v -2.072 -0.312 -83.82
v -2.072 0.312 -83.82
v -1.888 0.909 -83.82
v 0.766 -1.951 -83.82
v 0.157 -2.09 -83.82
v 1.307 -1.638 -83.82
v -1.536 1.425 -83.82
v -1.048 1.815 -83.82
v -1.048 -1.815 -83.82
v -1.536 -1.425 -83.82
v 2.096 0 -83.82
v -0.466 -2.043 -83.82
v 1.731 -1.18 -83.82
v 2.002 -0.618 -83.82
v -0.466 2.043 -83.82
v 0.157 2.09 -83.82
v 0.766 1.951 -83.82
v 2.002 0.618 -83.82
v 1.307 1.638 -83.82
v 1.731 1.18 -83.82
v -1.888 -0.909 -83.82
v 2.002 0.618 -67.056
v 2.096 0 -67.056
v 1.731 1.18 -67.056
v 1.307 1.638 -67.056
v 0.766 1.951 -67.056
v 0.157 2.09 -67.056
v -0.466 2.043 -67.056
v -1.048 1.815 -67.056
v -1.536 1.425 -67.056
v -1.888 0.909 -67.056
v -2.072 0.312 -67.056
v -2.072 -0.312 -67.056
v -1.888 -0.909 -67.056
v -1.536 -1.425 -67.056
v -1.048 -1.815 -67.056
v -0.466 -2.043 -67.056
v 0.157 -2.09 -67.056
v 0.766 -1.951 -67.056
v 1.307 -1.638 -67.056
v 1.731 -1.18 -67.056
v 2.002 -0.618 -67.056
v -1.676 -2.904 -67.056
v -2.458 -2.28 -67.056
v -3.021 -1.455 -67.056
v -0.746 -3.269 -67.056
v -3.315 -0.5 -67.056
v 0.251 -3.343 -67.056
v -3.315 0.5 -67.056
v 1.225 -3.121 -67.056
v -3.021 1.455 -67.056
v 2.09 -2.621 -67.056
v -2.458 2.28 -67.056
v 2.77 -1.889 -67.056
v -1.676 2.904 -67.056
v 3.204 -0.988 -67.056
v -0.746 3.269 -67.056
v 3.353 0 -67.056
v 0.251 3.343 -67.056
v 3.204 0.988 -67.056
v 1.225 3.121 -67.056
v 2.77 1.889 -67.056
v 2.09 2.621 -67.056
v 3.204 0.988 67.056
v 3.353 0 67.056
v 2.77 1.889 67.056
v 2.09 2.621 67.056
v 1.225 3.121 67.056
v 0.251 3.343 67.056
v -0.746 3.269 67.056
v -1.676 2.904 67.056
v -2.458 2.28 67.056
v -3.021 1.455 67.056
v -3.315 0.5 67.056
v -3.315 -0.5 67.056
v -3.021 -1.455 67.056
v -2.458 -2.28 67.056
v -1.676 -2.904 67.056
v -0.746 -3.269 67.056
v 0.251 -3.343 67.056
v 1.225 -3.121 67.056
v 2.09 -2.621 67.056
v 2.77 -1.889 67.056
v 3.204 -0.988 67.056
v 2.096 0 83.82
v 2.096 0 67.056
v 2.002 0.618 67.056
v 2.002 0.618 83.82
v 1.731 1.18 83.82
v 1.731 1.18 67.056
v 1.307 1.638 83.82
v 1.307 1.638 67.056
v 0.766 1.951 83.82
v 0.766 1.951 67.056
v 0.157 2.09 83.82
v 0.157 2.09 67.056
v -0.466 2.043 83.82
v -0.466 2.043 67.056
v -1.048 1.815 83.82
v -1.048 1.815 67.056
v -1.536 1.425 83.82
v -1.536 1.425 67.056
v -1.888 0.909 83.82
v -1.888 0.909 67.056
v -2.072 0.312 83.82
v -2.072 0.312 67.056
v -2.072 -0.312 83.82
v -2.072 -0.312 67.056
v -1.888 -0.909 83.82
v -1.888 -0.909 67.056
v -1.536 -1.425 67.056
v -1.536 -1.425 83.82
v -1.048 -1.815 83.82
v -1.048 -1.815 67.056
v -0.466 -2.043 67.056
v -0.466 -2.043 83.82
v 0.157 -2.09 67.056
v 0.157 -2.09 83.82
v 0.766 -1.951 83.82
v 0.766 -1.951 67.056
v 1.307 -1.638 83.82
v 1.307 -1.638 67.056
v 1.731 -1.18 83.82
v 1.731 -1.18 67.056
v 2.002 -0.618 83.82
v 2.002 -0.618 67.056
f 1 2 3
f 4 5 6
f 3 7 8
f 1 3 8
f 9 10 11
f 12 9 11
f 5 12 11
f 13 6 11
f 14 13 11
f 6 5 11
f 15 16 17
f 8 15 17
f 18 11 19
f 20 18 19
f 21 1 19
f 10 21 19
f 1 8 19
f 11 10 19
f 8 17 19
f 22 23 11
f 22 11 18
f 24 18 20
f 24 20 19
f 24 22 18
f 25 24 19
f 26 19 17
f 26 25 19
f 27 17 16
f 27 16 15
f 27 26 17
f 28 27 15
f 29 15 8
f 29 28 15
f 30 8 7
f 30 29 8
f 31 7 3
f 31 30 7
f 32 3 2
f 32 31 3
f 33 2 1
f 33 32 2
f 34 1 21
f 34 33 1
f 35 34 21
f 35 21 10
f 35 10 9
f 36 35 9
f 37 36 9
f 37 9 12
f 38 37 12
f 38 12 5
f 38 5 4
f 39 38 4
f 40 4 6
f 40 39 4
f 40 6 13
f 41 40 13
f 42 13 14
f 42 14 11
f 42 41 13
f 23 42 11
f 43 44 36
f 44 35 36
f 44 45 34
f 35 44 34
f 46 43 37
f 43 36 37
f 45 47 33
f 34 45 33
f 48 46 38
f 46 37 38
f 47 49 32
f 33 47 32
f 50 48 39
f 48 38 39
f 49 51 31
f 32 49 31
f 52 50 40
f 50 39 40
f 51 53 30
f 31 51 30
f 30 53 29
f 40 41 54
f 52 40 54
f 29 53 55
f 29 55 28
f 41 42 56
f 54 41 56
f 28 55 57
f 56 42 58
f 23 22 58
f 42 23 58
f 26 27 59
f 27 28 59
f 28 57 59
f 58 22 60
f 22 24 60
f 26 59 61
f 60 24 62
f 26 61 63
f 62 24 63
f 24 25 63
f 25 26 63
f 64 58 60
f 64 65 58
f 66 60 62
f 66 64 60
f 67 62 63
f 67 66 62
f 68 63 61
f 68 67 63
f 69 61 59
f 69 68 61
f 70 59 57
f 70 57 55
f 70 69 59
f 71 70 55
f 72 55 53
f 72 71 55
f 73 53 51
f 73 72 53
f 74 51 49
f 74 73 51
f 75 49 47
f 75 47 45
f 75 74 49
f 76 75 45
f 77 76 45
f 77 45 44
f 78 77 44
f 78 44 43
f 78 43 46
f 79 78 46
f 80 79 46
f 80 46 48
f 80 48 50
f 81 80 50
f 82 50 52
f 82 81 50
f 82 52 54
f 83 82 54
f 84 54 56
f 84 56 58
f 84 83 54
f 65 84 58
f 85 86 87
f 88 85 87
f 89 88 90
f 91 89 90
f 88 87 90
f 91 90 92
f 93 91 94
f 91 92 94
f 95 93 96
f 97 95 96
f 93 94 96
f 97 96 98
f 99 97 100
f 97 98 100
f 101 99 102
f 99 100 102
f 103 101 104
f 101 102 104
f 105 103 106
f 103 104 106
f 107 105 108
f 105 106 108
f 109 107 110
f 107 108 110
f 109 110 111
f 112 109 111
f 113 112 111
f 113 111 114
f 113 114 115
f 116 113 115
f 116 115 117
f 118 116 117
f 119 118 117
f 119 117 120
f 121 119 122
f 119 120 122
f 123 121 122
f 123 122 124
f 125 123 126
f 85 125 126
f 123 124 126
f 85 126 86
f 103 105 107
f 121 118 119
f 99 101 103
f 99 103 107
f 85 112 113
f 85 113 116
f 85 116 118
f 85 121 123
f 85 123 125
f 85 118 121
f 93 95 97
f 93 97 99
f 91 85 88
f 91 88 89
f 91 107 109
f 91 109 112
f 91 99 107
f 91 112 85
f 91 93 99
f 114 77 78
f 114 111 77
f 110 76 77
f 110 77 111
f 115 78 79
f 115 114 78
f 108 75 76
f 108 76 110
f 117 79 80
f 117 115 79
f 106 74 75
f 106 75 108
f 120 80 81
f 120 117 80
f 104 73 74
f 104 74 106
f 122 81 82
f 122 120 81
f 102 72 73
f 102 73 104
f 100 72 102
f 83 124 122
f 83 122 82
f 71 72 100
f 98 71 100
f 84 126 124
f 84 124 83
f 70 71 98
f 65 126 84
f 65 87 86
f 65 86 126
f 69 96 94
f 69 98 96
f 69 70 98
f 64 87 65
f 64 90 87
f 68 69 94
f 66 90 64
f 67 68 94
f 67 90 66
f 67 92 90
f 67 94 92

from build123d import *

# Parameters (mm, degrees)
SKETCH1_R           = 5.08
BOSS_EXTRUDE1_DEPTH = 101.6
SKETCH2_R           = 3.175
BOSS_EXTRUDE2_DEPTH = 25.4
SCALE1_SCALE        = 0.66


with BuildPart() as part:
    # Sketch1 → Boss-Extrude1 (new, symmetric)
    with BuildSketch(Plane.XY):
        Circle(SKETCH1_R)
    extrude(amount=BOSS_EXTRUDE1_DEPTH, both=True)

    # Sketch2 → Boss-Extrude2 (add)
    with BuildSketch(Plane.XY.offset(101.6)):
        Circle(SKETCH2_R)
    boss_extrude2 = extrude(amount=BOSS_EXTRUDE2_DEPTH)

    # Mirror1: Boss-Extrude2 across plane
    add(boss_extrude2.mirror(Plane.XY))


with BuildPart() as part_1:
    # Scale1: scaled about (0, 0, 0)
    add(part.part.scale(SCALE1_SCALE))


solid = part_1.part
